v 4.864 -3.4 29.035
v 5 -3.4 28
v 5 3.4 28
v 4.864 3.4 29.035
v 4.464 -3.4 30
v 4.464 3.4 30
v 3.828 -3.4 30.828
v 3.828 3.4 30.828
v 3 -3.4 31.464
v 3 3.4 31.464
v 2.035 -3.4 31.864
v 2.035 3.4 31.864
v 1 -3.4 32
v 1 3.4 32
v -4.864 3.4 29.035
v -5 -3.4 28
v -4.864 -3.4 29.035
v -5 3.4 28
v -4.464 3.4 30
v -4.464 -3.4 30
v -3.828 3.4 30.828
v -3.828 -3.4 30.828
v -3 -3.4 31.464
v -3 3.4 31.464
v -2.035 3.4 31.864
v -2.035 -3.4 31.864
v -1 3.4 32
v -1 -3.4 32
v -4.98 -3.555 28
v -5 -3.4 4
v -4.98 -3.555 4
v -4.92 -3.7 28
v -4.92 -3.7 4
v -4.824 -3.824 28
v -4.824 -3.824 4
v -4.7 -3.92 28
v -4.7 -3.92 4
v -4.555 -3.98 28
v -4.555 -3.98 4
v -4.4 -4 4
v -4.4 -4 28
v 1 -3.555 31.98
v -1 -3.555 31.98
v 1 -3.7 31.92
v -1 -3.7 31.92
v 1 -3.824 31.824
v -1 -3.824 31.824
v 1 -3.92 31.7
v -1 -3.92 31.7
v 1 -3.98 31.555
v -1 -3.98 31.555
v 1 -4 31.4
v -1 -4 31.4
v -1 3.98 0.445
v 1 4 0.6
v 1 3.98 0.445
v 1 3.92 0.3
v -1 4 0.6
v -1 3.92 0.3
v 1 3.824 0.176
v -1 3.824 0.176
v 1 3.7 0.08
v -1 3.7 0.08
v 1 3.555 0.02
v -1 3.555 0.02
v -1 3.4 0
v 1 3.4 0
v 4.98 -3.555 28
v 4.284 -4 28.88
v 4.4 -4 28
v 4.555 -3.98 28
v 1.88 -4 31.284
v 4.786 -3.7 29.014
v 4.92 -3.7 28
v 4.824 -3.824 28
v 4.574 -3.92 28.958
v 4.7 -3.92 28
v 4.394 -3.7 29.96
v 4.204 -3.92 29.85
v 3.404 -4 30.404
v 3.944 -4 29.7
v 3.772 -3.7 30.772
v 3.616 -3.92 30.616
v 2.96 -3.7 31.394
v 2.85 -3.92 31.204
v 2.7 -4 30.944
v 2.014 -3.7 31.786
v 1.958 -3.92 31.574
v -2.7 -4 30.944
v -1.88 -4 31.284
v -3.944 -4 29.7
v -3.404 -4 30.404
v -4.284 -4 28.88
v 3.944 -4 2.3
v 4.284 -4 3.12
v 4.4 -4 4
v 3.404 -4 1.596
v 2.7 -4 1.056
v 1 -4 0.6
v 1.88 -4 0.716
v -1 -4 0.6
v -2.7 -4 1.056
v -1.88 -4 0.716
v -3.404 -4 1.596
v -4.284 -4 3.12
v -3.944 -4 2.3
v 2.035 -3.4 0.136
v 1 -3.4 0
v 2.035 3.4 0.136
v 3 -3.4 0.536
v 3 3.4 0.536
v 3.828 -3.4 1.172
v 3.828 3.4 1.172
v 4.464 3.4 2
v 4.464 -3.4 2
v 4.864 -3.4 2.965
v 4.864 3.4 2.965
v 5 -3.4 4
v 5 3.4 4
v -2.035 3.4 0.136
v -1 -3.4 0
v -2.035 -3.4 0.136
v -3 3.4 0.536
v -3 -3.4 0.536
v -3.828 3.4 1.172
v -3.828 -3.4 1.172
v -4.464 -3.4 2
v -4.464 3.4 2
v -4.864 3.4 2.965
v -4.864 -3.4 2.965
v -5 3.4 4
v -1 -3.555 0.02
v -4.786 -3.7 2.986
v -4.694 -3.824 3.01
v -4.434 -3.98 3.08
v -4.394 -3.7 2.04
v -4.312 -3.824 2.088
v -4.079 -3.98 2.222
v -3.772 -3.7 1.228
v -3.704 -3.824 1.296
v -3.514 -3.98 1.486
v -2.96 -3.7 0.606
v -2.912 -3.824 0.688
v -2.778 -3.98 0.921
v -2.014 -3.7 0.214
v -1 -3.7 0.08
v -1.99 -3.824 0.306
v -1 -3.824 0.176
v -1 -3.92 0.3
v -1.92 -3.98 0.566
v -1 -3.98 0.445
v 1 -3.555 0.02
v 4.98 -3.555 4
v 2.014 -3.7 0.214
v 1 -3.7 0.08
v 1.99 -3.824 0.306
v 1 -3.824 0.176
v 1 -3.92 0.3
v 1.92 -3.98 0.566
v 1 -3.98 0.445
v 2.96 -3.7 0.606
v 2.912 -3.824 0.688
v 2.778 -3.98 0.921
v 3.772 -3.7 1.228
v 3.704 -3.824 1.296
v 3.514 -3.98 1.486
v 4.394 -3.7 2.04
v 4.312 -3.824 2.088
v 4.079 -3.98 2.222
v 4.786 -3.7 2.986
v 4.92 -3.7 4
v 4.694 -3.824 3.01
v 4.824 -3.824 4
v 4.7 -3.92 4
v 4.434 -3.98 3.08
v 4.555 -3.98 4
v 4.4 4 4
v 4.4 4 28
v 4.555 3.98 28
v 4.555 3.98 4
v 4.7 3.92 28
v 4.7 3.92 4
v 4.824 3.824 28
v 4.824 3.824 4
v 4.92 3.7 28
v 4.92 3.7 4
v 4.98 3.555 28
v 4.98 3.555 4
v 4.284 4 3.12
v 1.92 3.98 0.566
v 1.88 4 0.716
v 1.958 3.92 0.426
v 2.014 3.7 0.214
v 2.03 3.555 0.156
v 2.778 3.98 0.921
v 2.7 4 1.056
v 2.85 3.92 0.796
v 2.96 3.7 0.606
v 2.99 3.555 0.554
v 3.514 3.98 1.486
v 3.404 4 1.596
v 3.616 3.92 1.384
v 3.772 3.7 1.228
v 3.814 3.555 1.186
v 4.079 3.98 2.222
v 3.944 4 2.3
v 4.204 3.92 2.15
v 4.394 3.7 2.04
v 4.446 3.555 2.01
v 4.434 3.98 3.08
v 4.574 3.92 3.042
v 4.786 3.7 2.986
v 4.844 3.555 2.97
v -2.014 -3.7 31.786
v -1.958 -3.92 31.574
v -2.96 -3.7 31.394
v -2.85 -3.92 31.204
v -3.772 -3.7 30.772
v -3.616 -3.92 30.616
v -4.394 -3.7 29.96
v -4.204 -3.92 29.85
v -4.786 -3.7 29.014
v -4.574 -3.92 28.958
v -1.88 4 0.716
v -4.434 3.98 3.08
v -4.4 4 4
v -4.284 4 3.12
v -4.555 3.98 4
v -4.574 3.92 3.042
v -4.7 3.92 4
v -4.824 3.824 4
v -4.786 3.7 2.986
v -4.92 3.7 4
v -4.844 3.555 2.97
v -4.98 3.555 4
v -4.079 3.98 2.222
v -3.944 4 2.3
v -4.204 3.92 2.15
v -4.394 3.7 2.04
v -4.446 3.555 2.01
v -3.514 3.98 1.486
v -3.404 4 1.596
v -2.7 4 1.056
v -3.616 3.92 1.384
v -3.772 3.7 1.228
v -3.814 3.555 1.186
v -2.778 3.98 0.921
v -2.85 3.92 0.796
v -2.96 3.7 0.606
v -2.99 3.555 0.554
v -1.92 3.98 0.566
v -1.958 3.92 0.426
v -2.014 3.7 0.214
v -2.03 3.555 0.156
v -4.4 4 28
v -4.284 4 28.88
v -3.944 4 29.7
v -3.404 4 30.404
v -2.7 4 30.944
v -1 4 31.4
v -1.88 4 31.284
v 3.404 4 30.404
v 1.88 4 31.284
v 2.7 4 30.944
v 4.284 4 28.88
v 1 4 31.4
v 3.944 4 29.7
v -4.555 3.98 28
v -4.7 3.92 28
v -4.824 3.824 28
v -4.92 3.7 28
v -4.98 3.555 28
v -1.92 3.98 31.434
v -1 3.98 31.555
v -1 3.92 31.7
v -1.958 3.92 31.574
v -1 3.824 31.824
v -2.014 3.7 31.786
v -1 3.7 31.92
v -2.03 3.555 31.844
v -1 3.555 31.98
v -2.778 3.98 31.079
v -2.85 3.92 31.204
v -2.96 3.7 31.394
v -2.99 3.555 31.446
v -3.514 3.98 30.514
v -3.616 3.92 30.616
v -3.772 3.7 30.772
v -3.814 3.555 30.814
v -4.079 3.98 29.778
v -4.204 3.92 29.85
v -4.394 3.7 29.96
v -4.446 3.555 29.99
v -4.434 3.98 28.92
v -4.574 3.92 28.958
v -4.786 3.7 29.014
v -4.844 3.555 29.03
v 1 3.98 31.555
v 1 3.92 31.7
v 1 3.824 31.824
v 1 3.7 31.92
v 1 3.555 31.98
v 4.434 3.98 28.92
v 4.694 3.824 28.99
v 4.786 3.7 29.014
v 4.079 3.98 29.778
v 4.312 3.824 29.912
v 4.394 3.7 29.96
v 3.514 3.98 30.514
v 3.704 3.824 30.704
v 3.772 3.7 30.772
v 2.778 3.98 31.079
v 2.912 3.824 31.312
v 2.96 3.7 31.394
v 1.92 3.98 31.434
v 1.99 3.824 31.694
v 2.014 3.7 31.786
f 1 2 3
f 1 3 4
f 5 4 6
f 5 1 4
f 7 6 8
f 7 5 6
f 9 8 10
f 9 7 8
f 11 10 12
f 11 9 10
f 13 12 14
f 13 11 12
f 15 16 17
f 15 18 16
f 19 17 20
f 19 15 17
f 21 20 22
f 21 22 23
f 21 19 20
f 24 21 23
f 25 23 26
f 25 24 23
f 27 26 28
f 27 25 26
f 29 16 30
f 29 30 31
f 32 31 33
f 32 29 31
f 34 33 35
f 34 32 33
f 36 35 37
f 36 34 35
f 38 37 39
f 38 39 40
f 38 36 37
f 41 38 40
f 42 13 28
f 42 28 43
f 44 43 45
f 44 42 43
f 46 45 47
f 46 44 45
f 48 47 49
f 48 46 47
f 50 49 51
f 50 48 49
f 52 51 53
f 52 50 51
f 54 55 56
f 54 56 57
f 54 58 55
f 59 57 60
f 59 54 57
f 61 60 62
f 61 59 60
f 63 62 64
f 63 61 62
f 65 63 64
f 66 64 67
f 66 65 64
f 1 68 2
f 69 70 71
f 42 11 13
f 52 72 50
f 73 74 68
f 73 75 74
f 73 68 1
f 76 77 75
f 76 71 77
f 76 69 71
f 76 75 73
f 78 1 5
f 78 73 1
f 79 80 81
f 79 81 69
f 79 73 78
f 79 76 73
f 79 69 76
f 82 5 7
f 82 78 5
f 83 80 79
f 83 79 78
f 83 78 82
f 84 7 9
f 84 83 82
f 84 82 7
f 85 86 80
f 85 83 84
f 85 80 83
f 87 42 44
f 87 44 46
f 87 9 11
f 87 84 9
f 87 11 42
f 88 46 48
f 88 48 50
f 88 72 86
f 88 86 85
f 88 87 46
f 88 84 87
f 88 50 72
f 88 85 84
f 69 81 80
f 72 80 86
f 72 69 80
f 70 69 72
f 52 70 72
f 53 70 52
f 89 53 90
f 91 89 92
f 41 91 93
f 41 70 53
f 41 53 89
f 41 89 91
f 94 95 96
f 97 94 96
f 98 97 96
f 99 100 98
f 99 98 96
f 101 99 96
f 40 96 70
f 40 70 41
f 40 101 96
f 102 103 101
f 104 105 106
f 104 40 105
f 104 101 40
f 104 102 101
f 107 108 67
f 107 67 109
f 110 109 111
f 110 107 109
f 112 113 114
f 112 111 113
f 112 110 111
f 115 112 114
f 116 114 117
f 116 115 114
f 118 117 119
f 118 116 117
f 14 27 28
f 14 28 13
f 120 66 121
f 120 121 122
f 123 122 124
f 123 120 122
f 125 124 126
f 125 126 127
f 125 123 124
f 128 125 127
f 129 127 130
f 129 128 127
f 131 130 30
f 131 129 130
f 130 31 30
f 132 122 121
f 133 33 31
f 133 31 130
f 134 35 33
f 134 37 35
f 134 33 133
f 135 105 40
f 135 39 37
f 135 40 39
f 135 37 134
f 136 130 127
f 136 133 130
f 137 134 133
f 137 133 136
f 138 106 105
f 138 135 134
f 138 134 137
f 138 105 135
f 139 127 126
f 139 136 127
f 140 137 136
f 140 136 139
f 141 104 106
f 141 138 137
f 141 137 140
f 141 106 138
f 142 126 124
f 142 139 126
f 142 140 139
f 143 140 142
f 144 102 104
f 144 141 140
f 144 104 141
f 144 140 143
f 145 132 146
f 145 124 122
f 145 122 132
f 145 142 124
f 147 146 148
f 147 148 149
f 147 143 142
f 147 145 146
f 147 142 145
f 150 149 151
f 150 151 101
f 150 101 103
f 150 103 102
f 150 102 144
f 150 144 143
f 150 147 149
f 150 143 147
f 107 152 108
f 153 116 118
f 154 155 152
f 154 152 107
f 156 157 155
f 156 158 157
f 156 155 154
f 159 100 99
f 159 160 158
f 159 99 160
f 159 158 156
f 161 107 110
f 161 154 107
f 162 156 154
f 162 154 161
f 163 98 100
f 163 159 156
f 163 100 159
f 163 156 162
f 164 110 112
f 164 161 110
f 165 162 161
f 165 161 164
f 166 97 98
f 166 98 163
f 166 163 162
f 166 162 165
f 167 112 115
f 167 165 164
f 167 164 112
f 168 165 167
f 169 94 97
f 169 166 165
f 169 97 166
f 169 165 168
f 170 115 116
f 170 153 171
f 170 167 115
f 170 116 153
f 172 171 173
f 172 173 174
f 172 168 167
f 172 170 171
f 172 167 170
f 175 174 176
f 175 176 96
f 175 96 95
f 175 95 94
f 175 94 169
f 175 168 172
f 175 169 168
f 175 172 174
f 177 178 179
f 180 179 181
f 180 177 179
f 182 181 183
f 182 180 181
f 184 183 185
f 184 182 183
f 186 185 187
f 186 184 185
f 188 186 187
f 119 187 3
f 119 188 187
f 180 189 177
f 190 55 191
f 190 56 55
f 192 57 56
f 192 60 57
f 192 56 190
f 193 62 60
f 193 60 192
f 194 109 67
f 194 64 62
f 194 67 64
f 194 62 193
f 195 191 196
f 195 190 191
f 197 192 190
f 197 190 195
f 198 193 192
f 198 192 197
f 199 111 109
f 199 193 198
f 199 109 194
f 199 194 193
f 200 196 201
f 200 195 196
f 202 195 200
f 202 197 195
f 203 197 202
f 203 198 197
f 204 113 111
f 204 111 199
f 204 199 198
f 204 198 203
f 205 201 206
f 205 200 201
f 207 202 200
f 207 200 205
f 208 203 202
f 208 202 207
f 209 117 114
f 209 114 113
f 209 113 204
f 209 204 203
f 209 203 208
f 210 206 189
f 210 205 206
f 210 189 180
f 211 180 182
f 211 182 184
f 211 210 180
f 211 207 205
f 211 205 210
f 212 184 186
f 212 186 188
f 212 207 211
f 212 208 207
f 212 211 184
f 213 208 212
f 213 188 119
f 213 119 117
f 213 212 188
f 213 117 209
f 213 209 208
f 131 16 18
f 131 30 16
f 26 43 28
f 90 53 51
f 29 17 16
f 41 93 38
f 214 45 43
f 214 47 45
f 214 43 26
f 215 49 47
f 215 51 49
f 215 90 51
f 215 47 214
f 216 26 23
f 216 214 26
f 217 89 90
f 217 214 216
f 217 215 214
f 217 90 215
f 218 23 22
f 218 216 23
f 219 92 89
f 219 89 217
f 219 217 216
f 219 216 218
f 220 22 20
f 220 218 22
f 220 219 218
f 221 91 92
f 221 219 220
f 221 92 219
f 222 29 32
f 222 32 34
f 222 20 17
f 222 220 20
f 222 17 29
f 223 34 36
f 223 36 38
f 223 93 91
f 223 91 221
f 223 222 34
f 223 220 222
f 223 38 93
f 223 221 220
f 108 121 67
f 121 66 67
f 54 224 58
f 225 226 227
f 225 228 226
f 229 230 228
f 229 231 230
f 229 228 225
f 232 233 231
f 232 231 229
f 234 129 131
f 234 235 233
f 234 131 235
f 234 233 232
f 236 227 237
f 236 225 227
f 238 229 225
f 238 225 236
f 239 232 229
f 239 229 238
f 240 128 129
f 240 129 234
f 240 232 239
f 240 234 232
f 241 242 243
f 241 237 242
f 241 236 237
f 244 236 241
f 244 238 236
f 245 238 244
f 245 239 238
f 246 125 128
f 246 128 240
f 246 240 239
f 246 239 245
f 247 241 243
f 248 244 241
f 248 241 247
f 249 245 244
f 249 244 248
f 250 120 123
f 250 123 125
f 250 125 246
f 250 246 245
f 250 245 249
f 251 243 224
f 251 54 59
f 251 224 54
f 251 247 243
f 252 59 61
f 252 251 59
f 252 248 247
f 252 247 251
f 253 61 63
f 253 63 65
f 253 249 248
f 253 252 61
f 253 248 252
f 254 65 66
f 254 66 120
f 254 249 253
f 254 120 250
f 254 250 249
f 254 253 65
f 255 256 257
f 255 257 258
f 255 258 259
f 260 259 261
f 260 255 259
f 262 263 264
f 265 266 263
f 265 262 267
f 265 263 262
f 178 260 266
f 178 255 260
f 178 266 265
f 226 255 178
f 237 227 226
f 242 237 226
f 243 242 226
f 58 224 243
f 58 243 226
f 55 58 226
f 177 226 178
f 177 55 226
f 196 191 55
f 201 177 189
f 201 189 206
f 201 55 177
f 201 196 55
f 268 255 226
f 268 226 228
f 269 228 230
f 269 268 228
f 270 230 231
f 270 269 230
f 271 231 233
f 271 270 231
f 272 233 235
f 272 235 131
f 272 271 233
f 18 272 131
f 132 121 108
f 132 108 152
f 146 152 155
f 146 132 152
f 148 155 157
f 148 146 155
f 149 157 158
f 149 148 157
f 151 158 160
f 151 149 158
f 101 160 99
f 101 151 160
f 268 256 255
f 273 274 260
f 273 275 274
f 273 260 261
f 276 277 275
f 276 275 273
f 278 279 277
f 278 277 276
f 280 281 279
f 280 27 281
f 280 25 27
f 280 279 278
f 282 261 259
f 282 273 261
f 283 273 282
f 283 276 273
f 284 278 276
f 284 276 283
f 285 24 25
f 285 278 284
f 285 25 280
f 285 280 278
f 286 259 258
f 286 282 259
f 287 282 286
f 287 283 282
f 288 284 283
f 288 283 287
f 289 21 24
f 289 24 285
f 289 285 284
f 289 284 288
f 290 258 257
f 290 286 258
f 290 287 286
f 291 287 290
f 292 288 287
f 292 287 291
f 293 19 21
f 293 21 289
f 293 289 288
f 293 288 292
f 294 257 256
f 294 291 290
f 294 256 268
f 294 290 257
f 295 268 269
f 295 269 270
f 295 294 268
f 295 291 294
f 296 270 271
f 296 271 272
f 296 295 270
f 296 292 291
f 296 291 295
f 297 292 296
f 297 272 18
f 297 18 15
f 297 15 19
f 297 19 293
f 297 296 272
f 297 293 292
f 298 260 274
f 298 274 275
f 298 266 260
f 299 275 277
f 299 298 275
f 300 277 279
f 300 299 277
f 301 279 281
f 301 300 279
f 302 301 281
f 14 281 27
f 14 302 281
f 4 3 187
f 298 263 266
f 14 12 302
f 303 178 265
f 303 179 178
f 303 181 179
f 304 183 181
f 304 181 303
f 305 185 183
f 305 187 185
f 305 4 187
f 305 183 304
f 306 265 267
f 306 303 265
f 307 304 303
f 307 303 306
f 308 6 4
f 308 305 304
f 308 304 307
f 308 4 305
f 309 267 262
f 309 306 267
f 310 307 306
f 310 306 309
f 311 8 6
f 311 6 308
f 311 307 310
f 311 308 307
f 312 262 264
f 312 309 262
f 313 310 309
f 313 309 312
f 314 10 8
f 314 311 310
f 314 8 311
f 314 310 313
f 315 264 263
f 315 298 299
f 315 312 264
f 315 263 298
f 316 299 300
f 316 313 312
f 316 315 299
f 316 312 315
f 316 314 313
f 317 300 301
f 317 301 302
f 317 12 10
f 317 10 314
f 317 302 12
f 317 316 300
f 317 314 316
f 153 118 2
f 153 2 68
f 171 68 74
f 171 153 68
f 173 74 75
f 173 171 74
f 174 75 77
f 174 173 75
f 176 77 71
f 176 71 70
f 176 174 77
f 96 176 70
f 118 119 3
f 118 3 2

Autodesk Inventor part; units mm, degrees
ref_plane "YZ Plane" through (0, 0, 0) normal (1, 0, 0) x (0, 1, 0)
ref_plane "XZ Plane" through (0, 0, 0) normal (0, 1, 0) x (-1, 0, 0)
ref_plane "XY Plane" through (0, 0, 0) normal (0, 0, 1) x (1, 0, 0)
sketch "Sketch1" plane through (0, 0, 0) normal (0, 0, 1) x (1, 0, 0)
  line L0 (-5, 4) -> (5, 4)
  line L1 (5, 4) -> (5, -4)
  line L2 (5, -4) -> (-5, -4)
  line L3 (-5, -4) -> (-5, 4)
  line L4 (-7, 0) -> (7, 0) construction
  line L5 (0, -5.6) -> (0, 5.6) construction
  point P0 (0, 0)
  point P1 (0, -4)
  point P2 (-5, 0)
  dimension "d0" = 10
  dimension "d1" = 8
extrude "Extrusion1" add sketch "Sketch1" along normal blind 32
fillet "Fillet3" radius 4 4 edges at (5, 0, 32) (-5, 0, 32) (5, 0, 0) (-5, 0, 0)
fillet "Fillet1" radius 0.6 4 edges at (-5, 4, 16) (-5, -4, 16) (5, 4, 16) (5, -4, 16)
equation "\"d2\" = GearKey_L"
equation "\"TD\" = 0.3"
equation "\"Ball_DIA\" = 6"
equation "\"Screw_L\" = 292"
equation "\"Screw_DIA\" = 36"
equation "\"Nut_OD\" = 66"
equation "\"BPath_REVQ\" = 5.75"
equation "\"Tread_OFFSET\" = 8.075"
equation "\"SteeringColumn_DIA\" = 26"
equation "\"SteeringColumnChamfer_DEG\" = 20deg"
equation "\"Rack_L\" = 307.252"
equation "\"NutCapTread_L\" = 25"
equation "\"NutCapTread_THICKNESS\" = 5.365"
equation "\"SupportFlange_THICKNESS\" = 5"
equation "\"GearKey_L\" = 32"
properties part number "MCEN4000:G1K" material "STEEL, AISI 1015"
